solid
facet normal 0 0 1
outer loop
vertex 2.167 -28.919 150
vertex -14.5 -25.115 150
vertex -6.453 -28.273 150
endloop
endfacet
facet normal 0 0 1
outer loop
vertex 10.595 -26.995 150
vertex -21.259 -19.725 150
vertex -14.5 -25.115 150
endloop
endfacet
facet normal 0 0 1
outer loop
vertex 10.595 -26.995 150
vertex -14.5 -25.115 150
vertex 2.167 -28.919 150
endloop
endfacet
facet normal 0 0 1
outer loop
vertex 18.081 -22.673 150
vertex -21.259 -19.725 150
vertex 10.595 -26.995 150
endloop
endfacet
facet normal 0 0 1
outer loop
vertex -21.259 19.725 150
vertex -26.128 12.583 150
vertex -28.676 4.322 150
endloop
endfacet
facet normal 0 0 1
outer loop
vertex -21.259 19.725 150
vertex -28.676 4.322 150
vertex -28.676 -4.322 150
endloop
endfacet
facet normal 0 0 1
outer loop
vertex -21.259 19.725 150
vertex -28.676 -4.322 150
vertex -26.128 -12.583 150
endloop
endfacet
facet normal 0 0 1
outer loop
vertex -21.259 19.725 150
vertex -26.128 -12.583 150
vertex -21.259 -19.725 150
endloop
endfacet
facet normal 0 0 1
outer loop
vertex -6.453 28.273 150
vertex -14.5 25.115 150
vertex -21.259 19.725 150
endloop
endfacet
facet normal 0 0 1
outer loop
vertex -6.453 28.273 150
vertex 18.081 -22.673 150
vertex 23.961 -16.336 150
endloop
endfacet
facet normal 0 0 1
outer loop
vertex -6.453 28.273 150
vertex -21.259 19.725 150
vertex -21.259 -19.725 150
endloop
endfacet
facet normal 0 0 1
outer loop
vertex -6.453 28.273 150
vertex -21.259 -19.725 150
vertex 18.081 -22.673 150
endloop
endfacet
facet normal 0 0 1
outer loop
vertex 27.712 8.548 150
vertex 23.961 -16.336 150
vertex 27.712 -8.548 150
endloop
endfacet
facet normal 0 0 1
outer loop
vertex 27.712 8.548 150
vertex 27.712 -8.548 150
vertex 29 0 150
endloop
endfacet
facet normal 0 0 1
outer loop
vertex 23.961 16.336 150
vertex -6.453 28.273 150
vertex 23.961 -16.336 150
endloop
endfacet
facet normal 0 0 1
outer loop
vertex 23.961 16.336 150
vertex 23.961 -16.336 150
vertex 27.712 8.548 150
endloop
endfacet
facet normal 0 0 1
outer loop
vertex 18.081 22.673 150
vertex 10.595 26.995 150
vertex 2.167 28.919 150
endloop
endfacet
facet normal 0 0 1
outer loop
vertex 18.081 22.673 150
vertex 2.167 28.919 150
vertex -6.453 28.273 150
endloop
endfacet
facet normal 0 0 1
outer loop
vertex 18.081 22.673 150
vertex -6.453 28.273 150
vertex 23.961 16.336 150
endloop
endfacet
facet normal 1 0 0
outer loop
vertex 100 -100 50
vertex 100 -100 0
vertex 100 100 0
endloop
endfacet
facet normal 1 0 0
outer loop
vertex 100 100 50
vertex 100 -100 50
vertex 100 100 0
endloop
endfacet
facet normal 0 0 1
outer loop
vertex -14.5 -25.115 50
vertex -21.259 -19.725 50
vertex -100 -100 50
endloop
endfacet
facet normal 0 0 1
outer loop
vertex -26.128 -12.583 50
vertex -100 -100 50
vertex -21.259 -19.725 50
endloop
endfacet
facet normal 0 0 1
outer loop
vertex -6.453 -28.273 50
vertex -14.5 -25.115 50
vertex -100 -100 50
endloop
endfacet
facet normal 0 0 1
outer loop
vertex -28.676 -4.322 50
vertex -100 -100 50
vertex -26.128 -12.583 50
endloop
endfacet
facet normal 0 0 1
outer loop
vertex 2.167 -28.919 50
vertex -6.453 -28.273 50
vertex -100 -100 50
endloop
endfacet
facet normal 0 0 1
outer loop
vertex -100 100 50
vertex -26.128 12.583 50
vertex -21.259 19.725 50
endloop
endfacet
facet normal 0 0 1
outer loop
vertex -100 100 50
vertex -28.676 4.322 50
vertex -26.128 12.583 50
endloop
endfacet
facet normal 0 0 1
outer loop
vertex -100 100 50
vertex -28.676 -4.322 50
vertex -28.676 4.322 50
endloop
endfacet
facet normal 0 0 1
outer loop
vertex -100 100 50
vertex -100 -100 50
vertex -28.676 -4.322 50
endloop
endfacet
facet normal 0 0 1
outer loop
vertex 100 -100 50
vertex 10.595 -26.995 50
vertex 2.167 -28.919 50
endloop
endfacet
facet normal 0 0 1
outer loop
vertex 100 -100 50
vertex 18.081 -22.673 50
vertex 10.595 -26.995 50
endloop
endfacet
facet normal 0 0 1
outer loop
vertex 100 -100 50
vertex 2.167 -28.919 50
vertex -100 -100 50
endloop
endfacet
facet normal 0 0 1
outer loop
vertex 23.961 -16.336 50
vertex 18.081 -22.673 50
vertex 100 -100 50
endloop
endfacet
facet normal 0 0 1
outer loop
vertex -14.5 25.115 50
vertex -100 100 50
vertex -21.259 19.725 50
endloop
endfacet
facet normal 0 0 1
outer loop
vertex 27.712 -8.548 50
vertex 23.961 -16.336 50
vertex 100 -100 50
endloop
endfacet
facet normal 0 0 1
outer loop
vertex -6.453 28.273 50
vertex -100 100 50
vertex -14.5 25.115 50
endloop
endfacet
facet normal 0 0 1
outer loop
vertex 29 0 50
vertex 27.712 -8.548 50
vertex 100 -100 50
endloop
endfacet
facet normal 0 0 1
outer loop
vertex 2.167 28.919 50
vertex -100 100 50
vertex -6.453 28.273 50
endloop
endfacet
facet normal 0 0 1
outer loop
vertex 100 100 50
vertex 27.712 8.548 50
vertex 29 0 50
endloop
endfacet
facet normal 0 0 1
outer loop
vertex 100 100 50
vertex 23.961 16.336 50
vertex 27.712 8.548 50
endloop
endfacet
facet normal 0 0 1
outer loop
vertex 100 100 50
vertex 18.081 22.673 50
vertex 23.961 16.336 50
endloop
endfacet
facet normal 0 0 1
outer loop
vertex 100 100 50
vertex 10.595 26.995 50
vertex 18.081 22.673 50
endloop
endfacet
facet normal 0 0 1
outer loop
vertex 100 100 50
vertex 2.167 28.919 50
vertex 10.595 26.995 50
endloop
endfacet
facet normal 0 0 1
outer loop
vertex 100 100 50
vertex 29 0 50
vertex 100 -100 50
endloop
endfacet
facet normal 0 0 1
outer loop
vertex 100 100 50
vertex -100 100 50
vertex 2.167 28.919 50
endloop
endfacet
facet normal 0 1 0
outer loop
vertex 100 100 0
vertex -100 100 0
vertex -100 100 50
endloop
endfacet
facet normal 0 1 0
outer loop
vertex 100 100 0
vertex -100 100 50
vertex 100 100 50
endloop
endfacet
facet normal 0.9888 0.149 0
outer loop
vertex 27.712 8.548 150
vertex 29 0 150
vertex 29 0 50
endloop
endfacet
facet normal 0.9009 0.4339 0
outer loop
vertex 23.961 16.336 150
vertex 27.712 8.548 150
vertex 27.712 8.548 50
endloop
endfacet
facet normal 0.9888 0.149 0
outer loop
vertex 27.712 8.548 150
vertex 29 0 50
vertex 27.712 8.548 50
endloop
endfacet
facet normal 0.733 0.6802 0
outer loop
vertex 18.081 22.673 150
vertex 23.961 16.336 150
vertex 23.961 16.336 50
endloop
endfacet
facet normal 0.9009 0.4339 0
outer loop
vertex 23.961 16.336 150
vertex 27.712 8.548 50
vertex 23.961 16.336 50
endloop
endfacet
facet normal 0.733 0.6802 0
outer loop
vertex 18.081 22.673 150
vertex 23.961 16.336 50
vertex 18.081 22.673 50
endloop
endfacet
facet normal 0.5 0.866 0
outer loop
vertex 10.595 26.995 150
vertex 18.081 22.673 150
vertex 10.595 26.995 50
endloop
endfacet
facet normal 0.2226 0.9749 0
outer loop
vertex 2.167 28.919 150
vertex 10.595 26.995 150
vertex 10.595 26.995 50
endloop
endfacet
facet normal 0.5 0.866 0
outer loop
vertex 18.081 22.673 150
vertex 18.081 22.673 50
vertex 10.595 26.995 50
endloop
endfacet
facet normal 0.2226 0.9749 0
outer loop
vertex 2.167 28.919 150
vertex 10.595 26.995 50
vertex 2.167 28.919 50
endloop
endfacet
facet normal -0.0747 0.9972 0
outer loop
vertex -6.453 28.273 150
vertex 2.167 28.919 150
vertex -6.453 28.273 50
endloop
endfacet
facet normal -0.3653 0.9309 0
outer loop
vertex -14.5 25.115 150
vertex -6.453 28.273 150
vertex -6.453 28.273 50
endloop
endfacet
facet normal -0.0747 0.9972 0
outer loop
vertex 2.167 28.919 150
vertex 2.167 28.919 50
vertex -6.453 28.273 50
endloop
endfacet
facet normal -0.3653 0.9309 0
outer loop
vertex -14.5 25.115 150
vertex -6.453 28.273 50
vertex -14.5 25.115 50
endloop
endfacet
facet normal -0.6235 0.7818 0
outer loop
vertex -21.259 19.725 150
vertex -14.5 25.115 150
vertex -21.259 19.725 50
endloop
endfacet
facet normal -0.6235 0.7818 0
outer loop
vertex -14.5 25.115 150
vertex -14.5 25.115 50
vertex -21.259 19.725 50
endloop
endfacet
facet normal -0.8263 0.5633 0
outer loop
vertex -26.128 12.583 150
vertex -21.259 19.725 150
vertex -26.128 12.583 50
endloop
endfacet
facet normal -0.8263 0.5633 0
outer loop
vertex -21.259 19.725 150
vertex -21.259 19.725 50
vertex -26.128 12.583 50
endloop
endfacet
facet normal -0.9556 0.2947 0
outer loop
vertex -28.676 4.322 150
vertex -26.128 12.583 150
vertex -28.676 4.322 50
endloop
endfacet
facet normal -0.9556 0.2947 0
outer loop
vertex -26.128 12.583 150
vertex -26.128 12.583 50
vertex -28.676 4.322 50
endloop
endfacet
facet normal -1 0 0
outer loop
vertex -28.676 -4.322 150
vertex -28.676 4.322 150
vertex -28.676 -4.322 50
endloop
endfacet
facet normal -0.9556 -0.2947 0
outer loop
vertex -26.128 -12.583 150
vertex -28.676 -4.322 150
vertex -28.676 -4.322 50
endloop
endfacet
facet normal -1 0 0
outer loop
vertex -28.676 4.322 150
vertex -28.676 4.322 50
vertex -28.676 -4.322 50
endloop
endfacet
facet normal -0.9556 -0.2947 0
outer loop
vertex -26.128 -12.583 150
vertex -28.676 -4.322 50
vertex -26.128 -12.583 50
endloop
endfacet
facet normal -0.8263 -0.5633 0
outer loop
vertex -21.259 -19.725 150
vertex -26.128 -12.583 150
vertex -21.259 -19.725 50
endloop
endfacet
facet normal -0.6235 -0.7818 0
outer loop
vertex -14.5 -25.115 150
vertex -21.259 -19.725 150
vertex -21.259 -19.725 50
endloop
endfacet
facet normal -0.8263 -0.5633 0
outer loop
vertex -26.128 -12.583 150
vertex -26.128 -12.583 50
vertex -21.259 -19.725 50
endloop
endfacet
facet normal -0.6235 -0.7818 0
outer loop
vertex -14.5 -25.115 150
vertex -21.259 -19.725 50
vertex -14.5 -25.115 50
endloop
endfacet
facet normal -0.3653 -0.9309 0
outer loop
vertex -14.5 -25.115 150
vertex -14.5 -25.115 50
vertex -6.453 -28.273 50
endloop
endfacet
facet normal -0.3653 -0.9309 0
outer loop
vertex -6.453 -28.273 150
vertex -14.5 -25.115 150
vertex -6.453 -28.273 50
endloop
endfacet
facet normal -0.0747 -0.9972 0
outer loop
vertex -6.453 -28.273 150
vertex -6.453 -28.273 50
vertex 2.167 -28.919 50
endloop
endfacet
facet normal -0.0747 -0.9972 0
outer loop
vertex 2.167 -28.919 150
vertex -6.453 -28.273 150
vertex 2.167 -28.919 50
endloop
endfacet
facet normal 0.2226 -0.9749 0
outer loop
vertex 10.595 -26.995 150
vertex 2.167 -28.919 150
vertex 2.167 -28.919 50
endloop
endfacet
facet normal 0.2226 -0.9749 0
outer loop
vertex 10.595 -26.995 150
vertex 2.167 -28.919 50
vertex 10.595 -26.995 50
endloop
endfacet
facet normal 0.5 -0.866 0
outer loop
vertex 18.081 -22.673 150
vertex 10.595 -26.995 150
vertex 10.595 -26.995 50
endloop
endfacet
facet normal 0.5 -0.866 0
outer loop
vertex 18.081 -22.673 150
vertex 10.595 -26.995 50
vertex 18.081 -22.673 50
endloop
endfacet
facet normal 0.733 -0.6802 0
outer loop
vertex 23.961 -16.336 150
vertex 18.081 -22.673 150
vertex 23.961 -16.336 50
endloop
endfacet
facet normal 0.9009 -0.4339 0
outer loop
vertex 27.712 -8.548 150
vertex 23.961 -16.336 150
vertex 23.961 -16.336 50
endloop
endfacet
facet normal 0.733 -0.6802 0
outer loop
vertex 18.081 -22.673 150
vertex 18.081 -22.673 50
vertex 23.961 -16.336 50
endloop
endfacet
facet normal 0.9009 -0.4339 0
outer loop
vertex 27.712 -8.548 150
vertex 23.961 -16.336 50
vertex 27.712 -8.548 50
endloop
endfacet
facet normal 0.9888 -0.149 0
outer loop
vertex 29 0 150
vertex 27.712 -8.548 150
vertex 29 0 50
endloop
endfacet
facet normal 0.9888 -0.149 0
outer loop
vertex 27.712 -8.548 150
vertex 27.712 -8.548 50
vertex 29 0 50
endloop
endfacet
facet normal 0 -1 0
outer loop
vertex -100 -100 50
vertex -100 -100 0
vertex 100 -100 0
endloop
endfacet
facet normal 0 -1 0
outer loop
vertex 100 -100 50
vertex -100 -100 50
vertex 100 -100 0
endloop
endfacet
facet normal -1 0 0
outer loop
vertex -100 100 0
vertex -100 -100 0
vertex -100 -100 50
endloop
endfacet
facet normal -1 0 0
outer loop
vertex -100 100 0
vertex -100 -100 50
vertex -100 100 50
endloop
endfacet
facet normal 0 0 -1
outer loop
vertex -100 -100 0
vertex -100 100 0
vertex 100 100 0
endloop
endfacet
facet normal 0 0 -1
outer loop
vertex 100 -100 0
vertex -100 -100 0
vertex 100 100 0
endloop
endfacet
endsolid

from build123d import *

# Parameters (mm, degrees)
ESQUISSE1_W        = 200
ESQUISSE1_H        = 200
BOSS_EXTRU_1_DEPTH = 50
ESQUISSE2_R        = 29
BOSS_EXTRU_2_DEPTH = 100


with BuildPart() as part:
    # Esquisse1 → Boss.-Extru.1 (new body)
    with BuildSketch(Plane.XY):
        Rectangle(ESQUISSE1_W, ESQUISSE1_H)
    extrude(amount=BOSS_EXTRU_1_DEPTH)

    # Esquisse2 → Boss.-Extru.2 (add)
    with BuildSketch(Plane.XY.offset(50)):
        Circle(ESQUISSE2_R)
    extrude(amount=BOSS_EXTRU_2_DEPTH)


solid = part.part
